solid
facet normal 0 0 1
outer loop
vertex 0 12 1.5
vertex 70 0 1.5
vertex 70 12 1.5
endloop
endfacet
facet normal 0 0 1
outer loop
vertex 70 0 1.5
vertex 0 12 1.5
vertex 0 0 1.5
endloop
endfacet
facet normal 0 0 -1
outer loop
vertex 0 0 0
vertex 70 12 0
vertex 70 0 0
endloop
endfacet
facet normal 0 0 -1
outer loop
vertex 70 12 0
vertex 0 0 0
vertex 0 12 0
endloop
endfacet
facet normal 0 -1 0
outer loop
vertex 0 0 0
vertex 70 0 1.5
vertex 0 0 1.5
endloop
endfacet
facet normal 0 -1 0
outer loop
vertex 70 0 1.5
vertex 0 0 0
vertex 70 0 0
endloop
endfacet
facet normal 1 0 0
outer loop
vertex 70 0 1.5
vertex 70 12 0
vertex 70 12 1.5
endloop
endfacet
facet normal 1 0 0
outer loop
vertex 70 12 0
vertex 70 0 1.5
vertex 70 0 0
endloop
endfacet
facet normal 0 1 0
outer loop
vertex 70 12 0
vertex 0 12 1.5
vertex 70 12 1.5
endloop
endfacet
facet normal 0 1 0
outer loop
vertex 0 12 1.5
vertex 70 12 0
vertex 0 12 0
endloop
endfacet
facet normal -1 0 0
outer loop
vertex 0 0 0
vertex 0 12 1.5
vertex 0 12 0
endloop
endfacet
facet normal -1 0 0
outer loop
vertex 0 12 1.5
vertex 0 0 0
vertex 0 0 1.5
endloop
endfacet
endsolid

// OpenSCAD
// 10-well comb for agarose gel casting
// Print orientation: lying flat on XY plane (Z = 0), builds upward (+Z)

// Dimensions
thickness = 1.5;        // Total thickness (Z)
spine_length = 70;      // Spine length (X)
spine_width = 12;       // Spine width (Y)
num_wells = 10;         // Number of teeth/wells
tooth_width = 5.0;      // Width of each tooth (X)
tooth_length = 12;      // Length of each tooth (Y)
gap_width = 1.5;        // Gap between neighbouring teeth (X)

// Calculations
total_tooth_and_gap_width = num_wells * tooth_width + (num_wells - 1) * gap_width;
tooth_row_start_x = (spine_length - total_tooth_and_gap_width) / 2;

// Build the comb
module comb() {
    // Spine (base plate) - positioned at Y=0 to Y=spine_width
    cube([spine_length, spine_width, thickness]);
    
    // Teeth - extend from the +Y edge of the spine in the -Y direction
    for (i = [0 : num_wells - 1]) {
        // Calculate X position of each tooth, centered on spine
        tooth_x = tooth_row_start_x + i * (tooth_width + gap_width);
        
        // Position tooth: X as calculated, Y from spine_width to spine_width - tooth_length
        translate([tooth_x, spine_width, 0])
            cube([tooth_width, -tooth_length, thickness]);
    }
}

// Build the comb
comb();
